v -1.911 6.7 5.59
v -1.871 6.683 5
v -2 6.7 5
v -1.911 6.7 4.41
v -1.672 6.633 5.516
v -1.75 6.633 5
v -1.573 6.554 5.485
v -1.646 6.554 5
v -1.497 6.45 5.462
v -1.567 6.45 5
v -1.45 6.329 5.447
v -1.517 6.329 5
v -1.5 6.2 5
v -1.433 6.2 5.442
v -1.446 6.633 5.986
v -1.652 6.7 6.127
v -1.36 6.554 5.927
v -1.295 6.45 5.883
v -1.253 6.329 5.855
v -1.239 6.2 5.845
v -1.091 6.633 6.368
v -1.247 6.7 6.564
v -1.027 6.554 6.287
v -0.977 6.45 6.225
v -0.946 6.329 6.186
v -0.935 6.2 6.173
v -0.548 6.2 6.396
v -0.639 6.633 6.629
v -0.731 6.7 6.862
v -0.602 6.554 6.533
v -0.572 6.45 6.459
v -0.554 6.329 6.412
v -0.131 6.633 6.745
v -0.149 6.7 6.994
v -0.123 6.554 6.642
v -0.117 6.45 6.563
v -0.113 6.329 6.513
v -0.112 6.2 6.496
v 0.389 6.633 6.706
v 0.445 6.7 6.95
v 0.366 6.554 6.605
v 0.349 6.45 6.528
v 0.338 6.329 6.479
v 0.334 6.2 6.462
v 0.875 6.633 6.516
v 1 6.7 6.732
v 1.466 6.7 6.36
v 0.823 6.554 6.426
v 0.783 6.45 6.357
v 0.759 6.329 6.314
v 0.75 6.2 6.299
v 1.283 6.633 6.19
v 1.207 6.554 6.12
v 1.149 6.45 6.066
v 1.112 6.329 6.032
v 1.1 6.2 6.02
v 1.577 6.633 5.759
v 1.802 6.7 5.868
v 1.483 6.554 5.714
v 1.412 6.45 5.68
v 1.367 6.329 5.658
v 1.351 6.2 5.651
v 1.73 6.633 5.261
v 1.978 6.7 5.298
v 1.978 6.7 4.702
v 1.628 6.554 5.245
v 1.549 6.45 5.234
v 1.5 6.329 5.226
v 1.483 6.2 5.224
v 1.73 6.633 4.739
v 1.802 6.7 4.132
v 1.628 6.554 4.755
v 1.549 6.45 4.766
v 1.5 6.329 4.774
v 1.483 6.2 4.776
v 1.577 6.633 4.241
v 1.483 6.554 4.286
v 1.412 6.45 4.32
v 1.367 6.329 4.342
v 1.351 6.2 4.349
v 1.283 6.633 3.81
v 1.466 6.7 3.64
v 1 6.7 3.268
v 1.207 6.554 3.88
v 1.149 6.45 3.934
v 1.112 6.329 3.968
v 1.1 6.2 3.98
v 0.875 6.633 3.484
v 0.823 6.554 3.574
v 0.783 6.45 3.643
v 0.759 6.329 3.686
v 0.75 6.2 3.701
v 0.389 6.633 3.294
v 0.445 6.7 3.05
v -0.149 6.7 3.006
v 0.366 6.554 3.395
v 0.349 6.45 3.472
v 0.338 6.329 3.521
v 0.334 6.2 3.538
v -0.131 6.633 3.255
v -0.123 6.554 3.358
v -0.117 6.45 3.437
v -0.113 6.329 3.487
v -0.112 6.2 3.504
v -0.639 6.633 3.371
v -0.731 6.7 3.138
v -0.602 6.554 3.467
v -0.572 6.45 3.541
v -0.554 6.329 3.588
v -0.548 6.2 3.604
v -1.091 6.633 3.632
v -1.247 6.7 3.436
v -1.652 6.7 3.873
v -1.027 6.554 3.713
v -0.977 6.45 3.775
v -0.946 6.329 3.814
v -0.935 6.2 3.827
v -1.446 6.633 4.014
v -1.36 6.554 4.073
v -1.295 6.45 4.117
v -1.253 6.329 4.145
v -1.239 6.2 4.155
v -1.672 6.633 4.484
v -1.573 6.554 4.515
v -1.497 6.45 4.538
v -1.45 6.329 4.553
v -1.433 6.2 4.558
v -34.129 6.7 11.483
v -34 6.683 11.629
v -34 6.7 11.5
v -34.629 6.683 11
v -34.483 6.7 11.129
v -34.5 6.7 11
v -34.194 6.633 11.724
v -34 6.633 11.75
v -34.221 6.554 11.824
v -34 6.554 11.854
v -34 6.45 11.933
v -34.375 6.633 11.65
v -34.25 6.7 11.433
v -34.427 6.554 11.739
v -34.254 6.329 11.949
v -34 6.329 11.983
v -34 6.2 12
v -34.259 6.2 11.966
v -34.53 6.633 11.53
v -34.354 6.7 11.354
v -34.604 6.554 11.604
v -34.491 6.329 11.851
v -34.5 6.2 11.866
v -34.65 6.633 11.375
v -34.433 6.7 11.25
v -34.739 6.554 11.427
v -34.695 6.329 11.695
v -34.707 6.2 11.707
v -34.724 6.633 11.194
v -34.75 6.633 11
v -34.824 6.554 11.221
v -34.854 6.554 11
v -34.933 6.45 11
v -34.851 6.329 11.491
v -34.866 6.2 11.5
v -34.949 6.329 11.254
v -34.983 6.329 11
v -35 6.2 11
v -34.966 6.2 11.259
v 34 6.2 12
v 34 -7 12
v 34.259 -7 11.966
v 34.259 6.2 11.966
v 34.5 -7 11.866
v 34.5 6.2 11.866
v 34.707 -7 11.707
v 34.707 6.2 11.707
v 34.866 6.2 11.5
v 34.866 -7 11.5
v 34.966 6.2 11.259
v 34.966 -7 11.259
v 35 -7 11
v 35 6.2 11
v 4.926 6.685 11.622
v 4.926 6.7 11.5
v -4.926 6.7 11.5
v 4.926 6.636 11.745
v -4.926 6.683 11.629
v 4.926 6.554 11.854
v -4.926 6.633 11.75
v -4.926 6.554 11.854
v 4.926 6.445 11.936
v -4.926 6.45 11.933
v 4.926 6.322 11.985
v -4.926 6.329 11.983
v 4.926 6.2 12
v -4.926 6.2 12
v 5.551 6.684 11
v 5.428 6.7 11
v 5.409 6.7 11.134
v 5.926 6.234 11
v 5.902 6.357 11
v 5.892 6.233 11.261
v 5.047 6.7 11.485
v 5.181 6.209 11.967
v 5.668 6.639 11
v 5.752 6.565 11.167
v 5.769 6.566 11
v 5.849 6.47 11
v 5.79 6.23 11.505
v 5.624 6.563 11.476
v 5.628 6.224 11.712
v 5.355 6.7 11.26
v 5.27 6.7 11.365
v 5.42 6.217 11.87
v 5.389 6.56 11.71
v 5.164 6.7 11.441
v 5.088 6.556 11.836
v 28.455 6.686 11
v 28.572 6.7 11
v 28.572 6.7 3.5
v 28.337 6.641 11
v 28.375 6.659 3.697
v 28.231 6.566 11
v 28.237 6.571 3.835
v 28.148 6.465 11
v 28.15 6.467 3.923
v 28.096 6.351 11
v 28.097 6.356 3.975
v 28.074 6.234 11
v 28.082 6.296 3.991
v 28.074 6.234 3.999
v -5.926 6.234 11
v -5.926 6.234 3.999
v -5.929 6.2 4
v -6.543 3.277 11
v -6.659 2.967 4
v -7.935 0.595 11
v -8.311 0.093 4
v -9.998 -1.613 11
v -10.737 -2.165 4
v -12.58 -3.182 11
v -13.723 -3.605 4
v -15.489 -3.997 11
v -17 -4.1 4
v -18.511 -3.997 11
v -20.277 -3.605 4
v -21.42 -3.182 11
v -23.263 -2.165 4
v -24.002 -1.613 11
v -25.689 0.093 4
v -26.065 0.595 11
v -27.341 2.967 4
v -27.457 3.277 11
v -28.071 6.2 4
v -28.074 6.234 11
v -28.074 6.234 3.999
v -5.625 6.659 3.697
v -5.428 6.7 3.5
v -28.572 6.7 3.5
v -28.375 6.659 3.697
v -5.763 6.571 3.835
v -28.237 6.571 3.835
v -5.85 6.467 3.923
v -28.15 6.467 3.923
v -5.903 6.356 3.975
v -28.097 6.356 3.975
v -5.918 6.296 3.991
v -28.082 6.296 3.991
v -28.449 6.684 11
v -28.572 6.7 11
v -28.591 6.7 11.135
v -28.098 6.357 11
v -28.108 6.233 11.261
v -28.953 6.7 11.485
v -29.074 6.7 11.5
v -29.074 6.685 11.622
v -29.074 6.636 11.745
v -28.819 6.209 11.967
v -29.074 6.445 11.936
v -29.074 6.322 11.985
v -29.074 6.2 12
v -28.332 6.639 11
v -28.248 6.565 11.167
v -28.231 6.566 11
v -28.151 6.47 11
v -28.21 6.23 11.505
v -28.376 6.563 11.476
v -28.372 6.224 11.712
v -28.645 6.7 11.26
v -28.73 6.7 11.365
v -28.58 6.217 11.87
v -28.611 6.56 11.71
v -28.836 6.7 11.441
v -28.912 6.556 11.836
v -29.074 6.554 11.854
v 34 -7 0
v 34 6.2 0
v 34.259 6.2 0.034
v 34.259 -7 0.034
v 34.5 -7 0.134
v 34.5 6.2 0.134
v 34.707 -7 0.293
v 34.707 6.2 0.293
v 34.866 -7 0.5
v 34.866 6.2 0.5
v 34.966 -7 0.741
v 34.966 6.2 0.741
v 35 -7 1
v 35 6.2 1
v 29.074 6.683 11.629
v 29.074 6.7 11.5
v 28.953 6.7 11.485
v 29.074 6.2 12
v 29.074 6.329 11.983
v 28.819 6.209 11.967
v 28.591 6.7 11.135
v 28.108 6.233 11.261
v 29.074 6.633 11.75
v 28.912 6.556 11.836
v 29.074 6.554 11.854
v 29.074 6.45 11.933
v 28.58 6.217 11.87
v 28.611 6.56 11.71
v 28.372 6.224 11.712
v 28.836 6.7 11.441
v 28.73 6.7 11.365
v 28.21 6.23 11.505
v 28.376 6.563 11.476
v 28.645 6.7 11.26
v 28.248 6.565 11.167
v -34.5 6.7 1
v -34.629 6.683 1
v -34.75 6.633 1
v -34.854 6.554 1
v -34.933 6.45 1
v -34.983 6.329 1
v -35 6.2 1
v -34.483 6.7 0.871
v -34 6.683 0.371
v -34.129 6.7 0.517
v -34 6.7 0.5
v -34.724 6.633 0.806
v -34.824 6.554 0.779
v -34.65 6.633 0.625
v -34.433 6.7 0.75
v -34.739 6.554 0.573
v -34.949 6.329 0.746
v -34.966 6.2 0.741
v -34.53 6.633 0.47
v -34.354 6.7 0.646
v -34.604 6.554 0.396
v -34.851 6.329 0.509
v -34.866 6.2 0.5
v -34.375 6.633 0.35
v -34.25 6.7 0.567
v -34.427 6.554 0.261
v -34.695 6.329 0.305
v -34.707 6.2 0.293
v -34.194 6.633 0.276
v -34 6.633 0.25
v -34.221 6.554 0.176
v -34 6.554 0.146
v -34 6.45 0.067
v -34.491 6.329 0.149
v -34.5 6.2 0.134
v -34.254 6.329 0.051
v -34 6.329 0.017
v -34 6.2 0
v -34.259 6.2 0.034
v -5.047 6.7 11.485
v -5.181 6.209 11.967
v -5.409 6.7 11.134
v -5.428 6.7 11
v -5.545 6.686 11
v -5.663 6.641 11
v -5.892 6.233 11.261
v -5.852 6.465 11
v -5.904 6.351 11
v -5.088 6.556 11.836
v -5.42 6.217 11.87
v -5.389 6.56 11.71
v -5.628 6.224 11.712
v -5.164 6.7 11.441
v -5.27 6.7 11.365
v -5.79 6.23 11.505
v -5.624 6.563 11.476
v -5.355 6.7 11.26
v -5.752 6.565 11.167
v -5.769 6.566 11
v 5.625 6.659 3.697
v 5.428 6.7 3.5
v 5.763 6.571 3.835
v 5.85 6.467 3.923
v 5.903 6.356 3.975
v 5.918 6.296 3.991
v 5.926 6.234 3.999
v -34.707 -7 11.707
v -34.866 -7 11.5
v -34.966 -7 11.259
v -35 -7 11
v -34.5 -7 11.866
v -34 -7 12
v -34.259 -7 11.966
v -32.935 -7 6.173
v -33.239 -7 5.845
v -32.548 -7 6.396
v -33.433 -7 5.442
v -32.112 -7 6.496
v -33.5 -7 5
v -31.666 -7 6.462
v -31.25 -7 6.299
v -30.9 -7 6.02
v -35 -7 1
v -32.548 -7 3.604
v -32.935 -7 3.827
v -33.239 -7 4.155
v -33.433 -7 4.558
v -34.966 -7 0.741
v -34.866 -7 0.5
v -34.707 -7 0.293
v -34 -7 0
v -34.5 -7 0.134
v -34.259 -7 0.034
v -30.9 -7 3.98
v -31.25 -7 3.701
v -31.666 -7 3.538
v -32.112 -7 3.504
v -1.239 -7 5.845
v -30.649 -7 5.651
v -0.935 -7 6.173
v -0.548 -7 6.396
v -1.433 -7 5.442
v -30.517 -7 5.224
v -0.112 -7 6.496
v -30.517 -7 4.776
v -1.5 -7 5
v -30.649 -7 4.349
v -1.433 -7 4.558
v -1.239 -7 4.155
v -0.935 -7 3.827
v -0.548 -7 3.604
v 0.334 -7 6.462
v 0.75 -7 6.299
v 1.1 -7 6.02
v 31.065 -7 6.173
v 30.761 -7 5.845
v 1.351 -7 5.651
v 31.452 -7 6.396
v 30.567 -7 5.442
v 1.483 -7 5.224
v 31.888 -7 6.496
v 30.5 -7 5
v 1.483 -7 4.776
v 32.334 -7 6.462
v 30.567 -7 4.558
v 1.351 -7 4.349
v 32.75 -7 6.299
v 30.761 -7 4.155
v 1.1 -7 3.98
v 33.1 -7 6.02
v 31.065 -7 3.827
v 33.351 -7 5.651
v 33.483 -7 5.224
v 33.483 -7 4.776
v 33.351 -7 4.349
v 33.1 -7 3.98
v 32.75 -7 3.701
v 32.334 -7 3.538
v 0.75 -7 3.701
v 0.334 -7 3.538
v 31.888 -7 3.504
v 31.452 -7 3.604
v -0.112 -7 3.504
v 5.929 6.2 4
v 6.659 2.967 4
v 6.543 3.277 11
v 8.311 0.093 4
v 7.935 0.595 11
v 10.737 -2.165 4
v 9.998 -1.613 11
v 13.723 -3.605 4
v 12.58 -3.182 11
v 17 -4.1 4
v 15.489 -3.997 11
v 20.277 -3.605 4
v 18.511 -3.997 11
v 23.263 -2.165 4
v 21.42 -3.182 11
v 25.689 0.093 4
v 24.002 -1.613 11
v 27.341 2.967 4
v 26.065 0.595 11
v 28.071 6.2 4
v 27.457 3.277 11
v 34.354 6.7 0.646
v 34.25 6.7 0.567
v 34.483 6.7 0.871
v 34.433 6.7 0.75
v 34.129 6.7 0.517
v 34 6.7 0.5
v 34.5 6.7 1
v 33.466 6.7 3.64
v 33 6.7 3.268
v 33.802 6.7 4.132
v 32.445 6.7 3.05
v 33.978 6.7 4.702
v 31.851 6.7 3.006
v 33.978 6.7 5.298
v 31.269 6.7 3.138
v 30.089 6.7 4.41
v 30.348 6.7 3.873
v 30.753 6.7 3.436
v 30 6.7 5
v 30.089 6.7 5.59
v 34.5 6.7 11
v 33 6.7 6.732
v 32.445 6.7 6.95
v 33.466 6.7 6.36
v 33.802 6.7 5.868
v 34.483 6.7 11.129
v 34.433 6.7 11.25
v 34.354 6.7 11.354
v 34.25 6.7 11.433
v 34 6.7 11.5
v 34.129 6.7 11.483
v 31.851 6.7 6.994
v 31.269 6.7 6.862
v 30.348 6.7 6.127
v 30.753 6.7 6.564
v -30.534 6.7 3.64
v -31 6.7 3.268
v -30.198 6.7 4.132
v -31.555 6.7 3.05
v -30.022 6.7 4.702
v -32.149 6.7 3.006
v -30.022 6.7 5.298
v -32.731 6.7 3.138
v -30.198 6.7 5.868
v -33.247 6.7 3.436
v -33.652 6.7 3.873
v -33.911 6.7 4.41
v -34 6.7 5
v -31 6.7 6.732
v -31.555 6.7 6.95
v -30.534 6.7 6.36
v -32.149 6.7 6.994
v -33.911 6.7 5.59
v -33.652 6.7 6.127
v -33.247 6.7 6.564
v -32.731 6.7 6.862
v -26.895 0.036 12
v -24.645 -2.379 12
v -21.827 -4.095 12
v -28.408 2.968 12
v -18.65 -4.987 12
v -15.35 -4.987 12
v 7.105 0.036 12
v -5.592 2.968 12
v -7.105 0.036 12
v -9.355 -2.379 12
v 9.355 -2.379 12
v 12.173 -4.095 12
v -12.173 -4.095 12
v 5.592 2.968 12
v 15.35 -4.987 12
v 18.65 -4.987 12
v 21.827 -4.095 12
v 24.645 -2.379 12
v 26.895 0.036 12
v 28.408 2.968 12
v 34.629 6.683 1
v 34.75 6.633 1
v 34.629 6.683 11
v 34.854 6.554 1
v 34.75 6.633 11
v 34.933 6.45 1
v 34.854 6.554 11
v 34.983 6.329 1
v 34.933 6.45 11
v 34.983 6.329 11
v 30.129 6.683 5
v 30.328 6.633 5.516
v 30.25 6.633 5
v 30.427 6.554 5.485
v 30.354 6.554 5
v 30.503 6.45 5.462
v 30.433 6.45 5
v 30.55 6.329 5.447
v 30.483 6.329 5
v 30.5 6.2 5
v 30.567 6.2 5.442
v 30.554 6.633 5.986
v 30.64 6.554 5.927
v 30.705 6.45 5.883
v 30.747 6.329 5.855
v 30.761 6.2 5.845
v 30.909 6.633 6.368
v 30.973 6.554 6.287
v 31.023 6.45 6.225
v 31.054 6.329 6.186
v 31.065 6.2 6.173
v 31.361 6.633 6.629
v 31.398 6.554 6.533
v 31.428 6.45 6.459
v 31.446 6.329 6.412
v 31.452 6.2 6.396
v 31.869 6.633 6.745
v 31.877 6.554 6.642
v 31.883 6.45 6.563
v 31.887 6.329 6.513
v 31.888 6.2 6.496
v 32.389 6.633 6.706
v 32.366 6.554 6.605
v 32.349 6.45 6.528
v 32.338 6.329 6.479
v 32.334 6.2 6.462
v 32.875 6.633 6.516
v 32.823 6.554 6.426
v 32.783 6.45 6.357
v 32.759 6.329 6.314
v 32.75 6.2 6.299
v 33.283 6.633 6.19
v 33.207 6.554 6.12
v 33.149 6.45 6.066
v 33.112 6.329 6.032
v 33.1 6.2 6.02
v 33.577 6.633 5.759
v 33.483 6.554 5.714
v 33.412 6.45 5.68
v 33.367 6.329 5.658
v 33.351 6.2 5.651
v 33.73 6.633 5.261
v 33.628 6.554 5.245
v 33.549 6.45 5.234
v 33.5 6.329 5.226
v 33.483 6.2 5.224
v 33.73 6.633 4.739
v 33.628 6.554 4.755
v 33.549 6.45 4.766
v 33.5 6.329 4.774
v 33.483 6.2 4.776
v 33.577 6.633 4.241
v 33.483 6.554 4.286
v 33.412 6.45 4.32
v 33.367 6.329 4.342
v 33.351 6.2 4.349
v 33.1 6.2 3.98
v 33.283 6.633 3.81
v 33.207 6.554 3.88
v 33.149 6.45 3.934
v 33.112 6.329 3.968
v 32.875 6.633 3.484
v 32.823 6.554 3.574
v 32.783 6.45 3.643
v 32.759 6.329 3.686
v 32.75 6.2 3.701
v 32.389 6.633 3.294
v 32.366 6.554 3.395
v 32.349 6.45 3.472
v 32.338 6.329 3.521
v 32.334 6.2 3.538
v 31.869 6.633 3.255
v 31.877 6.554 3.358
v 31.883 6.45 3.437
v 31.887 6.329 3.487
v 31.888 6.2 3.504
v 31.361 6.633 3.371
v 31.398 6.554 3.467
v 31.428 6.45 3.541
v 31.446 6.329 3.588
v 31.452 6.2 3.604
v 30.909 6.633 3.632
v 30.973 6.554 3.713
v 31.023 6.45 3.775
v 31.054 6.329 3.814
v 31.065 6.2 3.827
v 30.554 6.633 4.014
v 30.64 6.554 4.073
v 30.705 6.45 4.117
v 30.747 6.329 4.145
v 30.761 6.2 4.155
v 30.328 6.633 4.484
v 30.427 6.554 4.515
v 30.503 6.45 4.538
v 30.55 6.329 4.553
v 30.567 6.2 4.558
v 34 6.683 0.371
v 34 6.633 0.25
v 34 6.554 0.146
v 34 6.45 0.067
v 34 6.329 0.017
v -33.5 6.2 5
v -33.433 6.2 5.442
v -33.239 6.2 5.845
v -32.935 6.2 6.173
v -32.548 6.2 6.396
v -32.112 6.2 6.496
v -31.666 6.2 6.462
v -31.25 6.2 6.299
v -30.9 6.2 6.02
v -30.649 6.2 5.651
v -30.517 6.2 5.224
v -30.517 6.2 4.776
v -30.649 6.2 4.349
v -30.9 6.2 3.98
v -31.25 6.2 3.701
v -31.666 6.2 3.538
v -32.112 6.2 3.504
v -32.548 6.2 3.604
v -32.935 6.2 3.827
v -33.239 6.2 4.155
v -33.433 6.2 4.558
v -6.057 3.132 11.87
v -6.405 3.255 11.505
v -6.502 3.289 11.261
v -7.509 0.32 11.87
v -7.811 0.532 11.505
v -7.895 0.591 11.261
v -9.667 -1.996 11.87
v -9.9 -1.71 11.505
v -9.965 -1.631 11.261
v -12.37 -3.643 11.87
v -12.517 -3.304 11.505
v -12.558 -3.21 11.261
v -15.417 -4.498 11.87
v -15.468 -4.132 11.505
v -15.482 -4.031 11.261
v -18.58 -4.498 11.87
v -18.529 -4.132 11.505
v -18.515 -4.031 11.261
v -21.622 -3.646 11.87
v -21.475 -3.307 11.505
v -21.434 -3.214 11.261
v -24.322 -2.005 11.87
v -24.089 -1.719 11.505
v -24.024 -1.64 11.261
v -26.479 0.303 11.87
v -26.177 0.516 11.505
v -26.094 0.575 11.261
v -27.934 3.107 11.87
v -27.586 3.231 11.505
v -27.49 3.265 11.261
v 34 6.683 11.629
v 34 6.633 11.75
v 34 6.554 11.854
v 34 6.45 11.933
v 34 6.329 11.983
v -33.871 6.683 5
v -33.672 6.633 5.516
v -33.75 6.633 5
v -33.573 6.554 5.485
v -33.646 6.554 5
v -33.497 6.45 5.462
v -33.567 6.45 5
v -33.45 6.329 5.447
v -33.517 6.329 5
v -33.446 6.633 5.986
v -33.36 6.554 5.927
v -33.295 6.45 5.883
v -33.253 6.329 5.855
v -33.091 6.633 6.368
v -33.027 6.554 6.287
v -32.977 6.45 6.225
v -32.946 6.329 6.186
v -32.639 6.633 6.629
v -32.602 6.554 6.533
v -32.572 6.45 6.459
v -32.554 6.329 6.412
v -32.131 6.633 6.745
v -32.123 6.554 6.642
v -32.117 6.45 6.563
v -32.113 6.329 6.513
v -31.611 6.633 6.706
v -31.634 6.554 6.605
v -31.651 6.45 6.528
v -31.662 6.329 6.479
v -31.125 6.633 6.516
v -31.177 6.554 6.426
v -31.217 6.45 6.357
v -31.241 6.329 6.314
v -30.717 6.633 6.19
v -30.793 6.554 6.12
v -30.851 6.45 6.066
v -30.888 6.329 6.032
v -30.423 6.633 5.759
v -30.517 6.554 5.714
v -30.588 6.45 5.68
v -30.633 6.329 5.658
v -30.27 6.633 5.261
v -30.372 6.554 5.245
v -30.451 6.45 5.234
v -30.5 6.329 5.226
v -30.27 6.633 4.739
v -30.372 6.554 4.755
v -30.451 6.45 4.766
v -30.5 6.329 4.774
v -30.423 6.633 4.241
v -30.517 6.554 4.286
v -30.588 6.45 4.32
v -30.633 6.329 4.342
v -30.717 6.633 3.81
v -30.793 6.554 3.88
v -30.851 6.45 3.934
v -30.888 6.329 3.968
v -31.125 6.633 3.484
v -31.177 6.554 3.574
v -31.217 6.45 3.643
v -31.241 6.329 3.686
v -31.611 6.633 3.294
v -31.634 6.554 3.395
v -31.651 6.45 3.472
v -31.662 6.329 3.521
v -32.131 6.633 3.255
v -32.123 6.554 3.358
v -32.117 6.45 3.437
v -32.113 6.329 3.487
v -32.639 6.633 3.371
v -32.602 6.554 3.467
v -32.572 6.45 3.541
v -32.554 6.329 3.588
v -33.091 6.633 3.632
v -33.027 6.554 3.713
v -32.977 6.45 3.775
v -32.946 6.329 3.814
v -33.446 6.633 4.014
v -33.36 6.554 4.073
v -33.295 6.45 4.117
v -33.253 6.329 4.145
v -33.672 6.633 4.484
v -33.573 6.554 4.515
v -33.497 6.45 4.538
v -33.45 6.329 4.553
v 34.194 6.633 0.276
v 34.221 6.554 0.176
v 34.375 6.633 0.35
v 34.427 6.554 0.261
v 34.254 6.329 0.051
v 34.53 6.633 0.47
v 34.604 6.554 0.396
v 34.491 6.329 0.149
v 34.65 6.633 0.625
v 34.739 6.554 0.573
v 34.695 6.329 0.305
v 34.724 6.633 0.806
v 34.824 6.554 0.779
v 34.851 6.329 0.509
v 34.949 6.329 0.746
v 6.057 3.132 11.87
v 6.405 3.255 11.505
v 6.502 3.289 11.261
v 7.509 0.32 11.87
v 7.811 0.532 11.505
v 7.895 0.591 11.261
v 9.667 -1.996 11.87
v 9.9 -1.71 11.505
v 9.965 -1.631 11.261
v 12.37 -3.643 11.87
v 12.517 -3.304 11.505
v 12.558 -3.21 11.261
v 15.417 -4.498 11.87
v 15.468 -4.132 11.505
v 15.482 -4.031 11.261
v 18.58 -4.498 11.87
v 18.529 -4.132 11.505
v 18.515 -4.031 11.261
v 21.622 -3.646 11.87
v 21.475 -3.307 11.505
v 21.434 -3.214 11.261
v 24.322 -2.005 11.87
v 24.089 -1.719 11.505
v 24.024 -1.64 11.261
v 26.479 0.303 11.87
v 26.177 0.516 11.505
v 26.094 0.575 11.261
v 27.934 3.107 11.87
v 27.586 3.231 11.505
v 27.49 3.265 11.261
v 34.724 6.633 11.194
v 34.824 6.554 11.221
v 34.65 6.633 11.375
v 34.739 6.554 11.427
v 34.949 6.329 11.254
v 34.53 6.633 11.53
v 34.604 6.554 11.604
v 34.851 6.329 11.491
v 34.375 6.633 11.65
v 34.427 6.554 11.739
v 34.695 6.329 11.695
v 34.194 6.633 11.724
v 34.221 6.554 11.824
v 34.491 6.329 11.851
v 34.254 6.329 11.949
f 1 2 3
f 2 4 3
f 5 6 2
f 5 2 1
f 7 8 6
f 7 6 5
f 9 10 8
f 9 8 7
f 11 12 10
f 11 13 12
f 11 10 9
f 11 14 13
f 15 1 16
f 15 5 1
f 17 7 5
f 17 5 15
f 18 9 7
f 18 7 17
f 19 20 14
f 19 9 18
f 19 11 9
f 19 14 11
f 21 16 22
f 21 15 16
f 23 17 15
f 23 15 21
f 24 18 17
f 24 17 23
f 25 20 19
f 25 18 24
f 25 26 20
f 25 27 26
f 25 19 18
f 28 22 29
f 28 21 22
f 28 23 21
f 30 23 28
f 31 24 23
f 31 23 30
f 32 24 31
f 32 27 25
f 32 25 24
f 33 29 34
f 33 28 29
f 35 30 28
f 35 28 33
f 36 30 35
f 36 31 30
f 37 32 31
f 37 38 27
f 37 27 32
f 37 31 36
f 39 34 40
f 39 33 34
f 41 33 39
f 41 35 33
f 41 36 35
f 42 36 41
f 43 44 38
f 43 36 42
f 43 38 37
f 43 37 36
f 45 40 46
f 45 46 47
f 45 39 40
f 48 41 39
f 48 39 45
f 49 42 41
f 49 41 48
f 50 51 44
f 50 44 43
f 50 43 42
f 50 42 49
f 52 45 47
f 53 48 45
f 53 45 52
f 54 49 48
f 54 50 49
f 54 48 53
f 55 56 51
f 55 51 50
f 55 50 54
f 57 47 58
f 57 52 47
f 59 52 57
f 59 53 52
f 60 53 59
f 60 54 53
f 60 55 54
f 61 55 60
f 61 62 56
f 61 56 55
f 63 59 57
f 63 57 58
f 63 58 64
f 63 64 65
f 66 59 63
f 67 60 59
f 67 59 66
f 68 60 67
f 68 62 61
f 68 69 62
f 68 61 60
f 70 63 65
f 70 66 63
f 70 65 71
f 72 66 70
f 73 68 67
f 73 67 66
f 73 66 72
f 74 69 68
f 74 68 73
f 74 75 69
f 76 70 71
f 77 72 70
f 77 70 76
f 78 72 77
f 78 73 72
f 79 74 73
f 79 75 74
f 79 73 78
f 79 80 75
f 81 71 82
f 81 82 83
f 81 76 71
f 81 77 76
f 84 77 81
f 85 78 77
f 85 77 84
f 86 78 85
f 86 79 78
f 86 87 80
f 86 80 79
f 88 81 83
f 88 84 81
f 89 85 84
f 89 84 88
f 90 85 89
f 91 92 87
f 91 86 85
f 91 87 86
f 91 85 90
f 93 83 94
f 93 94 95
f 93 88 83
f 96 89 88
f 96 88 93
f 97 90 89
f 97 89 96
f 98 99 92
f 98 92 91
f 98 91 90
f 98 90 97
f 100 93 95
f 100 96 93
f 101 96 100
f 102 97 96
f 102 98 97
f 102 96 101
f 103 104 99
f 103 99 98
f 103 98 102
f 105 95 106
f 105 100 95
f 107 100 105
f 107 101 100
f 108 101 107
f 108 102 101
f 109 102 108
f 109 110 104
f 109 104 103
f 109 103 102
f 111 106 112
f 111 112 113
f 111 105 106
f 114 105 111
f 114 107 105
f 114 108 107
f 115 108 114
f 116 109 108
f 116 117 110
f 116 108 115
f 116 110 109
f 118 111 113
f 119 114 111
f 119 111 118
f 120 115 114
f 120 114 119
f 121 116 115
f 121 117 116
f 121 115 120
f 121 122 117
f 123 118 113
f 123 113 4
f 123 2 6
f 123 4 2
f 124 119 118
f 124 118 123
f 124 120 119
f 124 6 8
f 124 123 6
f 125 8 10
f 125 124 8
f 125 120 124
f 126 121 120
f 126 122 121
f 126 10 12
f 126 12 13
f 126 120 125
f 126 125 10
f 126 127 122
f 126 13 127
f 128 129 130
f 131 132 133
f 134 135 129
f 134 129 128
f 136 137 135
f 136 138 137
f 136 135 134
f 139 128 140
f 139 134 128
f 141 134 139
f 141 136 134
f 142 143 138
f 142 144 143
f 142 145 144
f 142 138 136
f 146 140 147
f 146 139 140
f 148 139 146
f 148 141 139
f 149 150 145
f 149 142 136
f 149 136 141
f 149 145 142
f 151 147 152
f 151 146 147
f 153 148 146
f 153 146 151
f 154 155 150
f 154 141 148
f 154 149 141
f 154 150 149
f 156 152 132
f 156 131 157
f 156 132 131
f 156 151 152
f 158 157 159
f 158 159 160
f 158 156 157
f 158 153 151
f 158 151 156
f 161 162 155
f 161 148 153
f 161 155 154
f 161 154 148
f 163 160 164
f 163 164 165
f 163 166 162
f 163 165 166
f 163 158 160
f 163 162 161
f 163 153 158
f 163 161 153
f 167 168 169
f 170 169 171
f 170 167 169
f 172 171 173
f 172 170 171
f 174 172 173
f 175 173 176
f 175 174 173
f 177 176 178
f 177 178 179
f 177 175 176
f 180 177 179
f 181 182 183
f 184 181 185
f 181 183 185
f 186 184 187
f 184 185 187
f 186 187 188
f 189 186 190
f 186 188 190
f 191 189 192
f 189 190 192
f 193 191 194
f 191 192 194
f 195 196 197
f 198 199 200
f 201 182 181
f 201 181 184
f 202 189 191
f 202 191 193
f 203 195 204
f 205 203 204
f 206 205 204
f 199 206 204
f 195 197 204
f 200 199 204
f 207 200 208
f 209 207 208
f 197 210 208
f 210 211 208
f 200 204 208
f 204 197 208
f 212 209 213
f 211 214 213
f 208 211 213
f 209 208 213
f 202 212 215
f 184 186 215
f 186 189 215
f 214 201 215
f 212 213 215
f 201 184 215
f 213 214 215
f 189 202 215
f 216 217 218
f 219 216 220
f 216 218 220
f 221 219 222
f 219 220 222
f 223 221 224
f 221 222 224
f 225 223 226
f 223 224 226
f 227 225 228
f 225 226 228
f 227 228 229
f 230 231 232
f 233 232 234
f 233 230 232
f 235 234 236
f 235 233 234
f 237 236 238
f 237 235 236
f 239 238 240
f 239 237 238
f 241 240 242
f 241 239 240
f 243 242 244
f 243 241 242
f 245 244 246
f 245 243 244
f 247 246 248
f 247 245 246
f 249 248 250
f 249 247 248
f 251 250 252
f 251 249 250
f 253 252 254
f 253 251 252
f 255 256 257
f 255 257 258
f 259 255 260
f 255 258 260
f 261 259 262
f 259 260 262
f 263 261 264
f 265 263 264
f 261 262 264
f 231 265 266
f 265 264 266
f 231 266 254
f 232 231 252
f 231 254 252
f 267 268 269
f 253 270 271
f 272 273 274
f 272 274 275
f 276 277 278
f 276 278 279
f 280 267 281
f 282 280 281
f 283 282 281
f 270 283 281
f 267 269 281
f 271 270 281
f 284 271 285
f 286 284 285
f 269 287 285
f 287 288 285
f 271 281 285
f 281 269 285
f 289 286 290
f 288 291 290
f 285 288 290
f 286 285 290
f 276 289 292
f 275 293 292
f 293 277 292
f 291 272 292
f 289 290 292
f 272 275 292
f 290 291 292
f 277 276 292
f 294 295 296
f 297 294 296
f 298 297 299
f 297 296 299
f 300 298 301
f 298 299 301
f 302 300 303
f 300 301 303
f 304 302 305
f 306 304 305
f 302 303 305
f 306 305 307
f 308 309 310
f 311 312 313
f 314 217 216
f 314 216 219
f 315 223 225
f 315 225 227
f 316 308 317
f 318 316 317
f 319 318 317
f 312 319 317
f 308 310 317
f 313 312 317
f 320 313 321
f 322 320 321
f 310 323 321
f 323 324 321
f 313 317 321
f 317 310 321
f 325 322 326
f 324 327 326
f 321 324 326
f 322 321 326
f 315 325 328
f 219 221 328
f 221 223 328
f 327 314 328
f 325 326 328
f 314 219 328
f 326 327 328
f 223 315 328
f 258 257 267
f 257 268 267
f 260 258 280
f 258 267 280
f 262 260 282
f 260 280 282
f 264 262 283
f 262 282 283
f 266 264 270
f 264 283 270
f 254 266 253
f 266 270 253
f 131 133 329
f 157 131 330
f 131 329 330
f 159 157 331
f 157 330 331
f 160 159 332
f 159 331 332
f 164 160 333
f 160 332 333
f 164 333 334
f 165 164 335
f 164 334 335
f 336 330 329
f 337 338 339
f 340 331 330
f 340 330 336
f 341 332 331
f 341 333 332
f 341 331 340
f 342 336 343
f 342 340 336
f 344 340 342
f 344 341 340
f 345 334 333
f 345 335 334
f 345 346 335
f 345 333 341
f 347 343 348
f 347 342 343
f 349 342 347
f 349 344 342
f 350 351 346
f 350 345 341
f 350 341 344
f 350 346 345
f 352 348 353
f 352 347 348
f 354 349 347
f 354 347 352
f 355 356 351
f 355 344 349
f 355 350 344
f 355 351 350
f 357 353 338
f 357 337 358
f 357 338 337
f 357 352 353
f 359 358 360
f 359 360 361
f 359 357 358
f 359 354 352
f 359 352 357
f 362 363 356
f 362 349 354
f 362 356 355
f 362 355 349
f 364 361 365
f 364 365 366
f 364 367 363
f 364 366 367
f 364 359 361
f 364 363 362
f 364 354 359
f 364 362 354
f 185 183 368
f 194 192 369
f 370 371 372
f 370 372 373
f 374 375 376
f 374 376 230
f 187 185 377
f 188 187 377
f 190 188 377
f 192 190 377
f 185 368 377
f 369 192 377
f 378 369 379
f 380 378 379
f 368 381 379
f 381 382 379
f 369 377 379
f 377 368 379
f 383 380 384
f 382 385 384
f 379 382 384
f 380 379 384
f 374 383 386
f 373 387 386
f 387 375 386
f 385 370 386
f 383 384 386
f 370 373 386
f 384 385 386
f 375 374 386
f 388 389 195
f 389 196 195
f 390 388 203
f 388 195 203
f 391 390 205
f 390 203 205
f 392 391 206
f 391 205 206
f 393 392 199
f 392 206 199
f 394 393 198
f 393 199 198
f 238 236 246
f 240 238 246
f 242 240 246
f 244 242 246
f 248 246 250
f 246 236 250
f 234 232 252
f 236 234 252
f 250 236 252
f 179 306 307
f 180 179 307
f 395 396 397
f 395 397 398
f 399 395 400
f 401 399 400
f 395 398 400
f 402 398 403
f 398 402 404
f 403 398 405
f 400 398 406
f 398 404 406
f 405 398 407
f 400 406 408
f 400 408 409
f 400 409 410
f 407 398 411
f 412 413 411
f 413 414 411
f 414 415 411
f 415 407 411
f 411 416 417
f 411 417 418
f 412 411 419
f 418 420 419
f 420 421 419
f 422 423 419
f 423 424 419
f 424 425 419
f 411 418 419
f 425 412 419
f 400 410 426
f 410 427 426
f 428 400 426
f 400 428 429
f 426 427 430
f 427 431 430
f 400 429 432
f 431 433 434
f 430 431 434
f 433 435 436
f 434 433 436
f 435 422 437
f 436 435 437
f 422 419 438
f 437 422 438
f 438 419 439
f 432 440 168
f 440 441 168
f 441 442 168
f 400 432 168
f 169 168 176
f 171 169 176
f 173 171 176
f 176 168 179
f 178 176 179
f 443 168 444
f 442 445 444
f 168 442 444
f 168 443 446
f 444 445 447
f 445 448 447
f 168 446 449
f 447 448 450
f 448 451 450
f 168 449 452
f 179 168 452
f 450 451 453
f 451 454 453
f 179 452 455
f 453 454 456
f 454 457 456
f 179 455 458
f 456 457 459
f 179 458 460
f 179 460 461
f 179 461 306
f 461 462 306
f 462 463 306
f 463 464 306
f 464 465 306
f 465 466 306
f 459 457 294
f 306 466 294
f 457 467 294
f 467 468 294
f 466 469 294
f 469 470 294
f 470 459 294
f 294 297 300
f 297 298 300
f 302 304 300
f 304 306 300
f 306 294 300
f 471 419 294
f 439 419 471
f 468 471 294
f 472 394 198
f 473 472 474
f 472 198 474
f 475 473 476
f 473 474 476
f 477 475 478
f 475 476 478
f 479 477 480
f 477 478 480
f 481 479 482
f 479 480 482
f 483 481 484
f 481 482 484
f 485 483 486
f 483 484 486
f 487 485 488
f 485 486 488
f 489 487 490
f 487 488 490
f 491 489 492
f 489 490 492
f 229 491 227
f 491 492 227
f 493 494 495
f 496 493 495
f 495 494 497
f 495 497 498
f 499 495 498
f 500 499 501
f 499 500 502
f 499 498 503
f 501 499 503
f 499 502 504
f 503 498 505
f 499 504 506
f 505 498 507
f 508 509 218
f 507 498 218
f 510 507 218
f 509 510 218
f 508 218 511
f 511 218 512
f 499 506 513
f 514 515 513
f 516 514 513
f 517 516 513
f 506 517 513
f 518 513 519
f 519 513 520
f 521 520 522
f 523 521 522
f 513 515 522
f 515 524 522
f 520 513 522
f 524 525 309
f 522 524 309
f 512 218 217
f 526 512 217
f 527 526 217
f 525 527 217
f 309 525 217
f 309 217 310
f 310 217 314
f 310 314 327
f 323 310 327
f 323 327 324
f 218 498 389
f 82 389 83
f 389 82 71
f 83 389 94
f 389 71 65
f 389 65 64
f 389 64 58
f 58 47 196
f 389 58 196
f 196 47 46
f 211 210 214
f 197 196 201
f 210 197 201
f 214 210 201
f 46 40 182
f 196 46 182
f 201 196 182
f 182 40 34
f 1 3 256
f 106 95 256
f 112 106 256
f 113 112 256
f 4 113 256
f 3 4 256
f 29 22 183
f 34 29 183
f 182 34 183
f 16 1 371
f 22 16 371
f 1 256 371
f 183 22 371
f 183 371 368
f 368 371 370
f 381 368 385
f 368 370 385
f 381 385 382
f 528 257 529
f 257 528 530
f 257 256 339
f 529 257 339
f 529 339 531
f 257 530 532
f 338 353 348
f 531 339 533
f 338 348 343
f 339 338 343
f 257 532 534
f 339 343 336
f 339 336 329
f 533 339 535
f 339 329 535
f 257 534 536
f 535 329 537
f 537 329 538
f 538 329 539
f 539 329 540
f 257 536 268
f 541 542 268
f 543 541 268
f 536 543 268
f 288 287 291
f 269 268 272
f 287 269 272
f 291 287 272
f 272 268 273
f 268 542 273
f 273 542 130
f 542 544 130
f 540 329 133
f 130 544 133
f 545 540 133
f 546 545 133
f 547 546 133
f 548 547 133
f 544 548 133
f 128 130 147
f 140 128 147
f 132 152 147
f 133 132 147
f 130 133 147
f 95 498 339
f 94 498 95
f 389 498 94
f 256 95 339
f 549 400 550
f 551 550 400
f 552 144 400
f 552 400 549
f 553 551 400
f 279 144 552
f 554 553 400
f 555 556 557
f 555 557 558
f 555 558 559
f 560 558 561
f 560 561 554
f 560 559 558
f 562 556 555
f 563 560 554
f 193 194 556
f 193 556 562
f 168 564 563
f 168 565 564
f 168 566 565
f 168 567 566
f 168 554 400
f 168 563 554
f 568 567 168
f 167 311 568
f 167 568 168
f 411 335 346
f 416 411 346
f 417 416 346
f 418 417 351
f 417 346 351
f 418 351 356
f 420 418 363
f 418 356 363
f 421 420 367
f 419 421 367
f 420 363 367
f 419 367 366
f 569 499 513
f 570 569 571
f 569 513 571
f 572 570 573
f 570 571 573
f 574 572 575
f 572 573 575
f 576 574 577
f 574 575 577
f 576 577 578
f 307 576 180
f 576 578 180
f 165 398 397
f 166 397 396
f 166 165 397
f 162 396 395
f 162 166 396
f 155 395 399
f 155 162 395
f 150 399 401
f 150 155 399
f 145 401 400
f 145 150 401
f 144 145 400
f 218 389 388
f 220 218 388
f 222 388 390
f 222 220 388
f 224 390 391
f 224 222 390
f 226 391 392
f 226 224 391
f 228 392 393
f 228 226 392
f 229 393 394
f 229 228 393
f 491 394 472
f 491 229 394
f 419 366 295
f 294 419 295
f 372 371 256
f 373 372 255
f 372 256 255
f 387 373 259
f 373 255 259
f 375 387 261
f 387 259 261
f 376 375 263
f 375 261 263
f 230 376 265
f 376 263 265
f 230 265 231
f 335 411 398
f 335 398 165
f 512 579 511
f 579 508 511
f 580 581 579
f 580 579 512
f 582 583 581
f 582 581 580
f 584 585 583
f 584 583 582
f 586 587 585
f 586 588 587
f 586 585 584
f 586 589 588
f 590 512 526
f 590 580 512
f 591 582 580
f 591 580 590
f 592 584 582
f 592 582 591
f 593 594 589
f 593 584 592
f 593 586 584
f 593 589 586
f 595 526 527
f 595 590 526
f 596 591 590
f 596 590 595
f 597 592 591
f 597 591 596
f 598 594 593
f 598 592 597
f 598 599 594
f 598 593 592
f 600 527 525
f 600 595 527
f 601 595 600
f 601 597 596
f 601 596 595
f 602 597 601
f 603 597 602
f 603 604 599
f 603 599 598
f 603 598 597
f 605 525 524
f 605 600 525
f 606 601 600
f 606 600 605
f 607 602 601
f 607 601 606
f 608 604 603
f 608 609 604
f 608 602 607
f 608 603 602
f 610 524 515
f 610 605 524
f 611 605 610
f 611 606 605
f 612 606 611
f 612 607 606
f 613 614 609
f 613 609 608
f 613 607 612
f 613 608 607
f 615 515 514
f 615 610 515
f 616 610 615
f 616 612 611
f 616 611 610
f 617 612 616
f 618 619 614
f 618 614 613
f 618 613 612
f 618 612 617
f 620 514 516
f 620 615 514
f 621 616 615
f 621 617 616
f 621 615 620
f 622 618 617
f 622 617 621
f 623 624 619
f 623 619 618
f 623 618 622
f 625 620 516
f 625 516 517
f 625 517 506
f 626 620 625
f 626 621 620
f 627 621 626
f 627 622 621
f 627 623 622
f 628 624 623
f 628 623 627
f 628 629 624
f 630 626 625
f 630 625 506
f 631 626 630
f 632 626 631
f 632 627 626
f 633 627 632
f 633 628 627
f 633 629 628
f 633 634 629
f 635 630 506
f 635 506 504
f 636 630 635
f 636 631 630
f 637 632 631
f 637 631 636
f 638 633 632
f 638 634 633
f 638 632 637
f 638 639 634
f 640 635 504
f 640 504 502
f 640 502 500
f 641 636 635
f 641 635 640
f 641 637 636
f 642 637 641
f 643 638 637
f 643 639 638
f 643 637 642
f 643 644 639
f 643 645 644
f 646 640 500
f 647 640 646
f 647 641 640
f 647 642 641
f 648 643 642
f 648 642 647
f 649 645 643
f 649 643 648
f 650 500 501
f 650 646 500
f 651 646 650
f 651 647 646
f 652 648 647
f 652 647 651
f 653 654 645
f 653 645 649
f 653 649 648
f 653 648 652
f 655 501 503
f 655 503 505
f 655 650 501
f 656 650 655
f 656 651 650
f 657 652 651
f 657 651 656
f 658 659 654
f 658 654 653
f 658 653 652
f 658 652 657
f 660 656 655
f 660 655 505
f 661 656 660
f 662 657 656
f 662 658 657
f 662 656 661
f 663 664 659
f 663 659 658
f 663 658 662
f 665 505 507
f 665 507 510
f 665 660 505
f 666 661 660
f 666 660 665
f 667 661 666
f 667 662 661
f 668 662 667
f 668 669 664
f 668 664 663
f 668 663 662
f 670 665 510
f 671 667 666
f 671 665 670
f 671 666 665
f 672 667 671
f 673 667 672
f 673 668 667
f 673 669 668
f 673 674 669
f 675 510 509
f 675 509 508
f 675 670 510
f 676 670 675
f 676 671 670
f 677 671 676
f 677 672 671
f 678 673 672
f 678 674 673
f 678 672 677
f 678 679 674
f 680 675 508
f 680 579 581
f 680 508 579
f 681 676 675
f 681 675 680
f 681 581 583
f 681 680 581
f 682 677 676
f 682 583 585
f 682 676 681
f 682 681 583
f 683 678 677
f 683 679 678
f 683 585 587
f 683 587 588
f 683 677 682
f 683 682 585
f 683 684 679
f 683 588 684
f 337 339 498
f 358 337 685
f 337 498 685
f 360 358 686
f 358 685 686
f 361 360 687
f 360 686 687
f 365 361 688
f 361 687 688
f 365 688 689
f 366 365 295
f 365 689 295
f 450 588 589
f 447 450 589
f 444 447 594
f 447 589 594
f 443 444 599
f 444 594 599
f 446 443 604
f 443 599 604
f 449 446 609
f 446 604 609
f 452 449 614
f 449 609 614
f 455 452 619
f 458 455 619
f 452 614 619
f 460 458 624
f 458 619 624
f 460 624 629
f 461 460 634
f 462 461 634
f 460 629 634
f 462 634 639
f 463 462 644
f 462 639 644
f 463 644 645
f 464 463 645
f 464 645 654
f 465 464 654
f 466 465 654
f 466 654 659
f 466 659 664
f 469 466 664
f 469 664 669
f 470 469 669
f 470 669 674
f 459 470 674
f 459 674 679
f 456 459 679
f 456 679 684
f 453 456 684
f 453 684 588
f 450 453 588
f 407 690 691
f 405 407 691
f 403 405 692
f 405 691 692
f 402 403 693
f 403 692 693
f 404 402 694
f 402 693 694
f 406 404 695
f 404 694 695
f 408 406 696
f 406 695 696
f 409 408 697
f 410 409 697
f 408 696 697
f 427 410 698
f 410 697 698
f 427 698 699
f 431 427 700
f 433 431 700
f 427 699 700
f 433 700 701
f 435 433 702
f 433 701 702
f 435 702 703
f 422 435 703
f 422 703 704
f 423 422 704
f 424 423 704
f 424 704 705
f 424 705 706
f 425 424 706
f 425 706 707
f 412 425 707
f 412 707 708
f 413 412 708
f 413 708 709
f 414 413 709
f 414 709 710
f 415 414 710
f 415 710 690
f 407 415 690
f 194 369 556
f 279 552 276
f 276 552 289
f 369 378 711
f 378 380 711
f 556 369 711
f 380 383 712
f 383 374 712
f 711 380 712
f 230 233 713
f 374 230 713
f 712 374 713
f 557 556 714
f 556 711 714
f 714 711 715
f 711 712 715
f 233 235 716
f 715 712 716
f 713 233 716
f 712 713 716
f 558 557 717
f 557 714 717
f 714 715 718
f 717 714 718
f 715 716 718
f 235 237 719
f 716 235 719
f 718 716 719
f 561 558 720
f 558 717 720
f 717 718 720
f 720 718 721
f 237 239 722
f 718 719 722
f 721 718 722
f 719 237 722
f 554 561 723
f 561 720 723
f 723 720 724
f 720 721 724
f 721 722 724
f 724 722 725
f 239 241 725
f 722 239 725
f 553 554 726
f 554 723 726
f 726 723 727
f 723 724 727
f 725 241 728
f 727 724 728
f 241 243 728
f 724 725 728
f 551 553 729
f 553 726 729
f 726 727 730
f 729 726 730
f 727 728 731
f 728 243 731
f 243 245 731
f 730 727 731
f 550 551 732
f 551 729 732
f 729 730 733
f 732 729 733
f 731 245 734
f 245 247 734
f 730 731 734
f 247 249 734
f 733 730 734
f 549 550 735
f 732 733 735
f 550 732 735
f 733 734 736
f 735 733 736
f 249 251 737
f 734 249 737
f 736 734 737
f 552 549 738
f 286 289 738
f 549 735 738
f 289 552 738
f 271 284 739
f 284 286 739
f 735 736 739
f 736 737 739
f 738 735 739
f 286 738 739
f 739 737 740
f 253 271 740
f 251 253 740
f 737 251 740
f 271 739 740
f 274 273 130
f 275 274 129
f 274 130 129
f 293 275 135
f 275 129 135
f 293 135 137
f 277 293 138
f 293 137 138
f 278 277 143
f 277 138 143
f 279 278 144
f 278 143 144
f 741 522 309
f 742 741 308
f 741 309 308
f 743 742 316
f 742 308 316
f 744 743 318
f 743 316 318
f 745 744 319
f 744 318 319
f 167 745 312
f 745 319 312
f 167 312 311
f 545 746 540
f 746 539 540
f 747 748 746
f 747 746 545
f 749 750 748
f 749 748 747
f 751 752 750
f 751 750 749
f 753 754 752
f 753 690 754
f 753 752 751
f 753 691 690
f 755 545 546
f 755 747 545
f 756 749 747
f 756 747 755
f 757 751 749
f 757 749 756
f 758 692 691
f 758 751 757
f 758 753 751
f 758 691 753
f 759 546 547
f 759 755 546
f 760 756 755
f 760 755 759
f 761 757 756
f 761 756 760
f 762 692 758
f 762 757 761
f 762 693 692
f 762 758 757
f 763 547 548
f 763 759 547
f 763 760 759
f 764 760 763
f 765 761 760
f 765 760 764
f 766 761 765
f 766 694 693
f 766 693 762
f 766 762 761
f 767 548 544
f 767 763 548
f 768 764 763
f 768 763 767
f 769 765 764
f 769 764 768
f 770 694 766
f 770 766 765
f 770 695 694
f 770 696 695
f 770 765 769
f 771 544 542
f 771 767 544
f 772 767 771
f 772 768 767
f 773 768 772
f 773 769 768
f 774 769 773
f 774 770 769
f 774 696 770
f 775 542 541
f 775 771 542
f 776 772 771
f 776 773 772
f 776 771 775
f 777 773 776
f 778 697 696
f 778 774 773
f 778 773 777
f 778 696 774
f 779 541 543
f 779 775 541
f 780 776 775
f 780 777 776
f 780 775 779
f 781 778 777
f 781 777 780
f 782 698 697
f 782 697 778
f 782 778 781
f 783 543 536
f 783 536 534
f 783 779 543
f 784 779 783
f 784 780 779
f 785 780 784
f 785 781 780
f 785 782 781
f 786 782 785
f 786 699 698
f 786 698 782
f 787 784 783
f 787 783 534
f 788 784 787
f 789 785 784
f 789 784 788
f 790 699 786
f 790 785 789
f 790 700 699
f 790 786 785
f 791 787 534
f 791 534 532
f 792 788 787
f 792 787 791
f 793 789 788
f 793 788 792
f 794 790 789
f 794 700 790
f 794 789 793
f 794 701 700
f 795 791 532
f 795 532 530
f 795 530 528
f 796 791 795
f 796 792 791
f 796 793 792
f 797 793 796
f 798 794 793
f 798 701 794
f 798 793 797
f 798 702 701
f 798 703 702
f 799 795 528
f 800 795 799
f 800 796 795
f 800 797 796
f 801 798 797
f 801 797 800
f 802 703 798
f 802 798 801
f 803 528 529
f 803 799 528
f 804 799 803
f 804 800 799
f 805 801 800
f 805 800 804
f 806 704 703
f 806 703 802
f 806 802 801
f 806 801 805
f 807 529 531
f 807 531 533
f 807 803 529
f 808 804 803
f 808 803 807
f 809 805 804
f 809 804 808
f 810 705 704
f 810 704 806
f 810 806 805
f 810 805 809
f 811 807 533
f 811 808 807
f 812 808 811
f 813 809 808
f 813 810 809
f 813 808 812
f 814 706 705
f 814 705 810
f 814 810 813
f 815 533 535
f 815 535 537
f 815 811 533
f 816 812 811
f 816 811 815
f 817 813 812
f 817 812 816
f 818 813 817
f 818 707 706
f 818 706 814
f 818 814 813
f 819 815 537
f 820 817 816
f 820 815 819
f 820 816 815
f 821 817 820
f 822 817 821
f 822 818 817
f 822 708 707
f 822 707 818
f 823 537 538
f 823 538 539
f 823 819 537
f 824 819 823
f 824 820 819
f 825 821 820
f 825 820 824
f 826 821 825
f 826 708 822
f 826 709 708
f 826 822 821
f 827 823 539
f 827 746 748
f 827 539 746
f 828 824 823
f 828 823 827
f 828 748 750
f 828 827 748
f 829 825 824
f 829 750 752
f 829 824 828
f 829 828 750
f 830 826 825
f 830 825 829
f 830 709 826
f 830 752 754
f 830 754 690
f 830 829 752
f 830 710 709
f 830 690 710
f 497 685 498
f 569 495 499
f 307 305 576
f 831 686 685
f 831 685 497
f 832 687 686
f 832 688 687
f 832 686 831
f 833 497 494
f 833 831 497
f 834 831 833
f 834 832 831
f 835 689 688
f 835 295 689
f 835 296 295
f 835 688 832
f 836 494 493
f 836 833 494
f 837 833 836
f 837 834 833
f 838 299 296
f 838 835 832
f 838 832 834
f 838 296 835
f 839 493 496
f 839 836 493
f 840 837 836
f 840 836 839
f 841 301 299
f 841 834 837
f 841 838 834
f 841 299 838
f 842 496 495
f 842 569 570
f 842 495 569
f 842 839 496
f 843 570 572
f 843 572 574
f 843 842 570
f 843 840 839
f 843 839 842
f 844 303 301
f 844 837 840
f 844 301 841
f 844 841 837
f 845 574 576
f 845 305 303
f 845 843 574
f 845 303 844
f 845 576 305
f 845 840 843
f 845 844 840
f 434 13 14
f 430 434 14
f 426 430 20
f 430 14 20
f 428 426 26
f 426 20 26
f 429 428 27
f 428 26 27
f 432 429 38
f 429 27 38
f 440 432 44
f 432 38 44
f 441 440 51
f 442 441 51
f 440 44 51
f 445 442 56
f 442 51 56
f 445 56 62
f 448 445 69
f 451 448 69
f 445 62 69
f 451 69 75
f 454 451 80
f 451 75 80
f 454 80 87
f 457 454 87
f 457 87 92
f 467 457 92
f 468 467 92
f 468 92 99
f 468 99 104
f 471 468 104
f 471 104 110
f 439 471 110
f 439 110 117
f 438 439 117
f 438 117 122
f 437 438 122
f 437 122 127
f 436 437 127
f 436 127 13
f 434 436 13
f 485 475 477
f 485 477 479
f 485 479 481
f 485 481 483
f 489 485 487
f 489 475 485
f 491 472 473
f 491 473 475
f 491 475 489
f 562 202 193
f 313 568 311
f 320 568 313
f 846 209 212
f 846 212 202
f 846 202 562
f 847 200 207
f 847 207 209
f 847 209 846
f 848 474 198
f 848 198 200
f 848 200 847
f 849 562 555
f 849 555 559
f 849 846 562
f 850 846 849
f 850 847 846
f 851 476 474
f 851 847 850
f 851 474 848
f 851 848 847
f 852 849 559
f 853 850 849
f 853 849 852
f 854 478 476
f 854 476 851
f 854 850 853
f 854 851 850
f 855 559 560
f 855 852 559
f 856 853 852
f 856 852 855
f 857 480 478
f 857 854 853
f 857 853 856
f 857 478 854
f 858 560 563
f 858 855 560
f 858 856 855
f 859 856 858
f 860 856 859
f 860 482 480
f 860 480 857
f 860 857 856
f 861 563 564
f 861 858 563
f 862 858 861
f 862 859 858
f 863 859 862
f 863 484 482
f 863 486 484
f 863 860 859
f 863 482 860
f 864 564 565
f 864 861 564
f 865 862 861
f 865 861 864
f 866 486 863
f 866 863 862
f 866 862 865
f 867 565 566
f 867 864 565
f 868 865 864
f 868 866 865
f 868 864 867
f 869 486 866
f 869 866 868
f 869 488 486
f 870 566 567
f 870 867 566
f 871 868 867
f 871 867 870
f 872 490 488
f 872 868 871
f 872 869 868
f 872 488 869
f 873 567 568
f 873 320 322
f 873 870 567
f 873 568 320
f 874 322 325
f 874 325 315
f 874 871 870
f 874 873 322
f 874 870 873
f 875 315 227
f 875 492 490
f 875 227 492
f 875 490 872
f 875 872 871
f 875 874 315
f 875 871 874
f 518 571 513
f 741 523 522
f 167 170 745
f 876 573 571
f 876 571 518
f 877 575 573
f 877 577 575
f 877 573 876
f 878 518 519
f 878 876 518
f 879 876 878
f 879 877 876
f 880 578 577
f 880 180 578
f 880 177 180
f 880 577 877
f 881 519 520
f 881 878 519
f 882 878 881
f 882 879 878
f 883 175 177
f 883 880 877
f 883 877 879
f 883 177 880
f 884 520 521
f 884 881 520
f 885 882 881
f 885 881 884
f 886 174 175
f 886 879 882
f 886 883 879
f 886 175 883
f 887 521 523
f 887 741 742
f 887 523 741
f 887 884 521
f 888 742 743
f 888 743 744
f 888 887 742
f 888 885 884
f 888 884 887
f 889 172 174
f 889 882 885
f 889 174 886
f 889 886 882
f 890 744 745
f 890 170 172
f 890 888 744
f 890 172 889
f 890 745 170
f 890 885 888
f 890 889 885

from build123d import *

# Parameters (mm, degrees)
SKETCH1_W           = 70
SKETCH1_H           = 14
BOSS_EXTRUDE1_DEPTH = 12
CUT_EXTRUDE1_DEPTH  = 8
SKETCH3_R           = 1.5
CUT_EXTRUDE2_DEPTH  = 40.56008089
SKETCH4_W           = 12
SKETCH4_H           = 0.3
CUT_EXTRUDE3_DEPTH  = 72.365257654
FILLET1_R           = 1
FILLET2_R           = 0.5


with BuildPart() as part:
    # Sketch1 → Boss-Extrude1 (new body)
    with BuildSketch(Plane.XY):
        Rectangle(SKETCH1_W, SKETCH1_H)
    extrude(amount=BOSS_EXTRUDE1_DEPTH)

    # Sketch2 → Cut-Extrude1 (cut)
    with BuildSketch(Plane.XY.offset(12)):
        with BuildLine():
            Line((5.9, 7), (28.1, 7))
            ThreePointArc((28.1, 7), (17, 18.1), (5.9, 7))
        make_face()
        with BuildLine():
            ThreePointArc((5.9, 7), (17, -4.1), (28.1, 7))
            Line((28.1, 7), (5.9, 7))
        make_face()
    cut_extrude1 = extrude(amount=-CUT_EXTRUDE1_DEPTH, mode=Mode.SUBTRACT)

    # Mirror1: Cut-Extrude1 across plane
    add(cut_extrude1.mirror(Plane(origin=(0, 0, 0), x_dir=(0, 0, 1), z_dir=(1, 0, 0))), mode=Mode.SUBTRACT)

    # Sketch3 → Cut-Extrude2 (cut, through all)
    with BuildSketch(Plane(origin=(0, 7, 0), x_dir=(1, 0, 0), z_dir=(0, 1, 0))):
        with Locations(Location((-32, -5, 0), (0, 0, 180))):
            Circle(SKETCH3_R)
        with Locations(Location((0, -5, 0), (0, 0, 180))):
            Circle(SKETCH3_R)
        with Locations(Location((32, -5, 0), (0, 0, 180))):
            Circle(SKETCH3_R)
    extrude(amount=-CUT_EXTRUDE2_DEPTH, mode=Mode.SUBTRACT)

    # Sketch4 → Cut-Extrude3 (cut, through all)
    with BuildSketch(Plane.ZY.offset(35)):
        with Locations((6, 6.85)):
            Rectangle(SKETCH4_W, SKETCH4_H)
    extrude(amount=-CUT_EXTRUDE3_DEPTH, mode=Mode.SUBTRACT)

    # Fillet1
    fillet1_edges = [part.edges().sort_by_distance(p)[0] for p in [
        (35, -0.15, 12),
        (-17, -4.1, 12),
        (35, -0.15, 0),
        (17, -4.1, 12),
        (-35, -0.15, 0),
        (-35, -0.15, 12),
    ]]
    fillet(fillet1_edges, radius=FILLET1_R)

    # Fillet2
    fillet2_edges = [part.edges().sort_by_distance(p)[0] for p in [
        (-30.5, 6.7, 5),
        (33.5, 6.7, 5),
        (1.5, 6.7, 5),
        (5.904054795, 6.7, 7.5),
        (-17, 6.7, 4),
        (-5.904054795, 6.7, 7.5),
        (17, 6.7, 4),
        (35, 6.7, 6),
        (31.54814021, 6.7, 12),
        (0, 6.7, 0),
        (-35, 6.7, 6),
        (-31.54814021, 6.7, 12),
        (-28.095945205, 6.7, 7.5),
        (0, 6.7, 12),
        (28.095945205, 6.7, 7.5),
        (-34.707106781, 6.7, 11.707106781),
        (-34.707106781, 6.7, 0.292893219),
        (-5.611001162, 6.7, 11.707162854),
        (-28.389554556, 6.7, 11.707717855),
        (5.611001162, 6.7, 11.707162854),
        (28.389554556, 6.7, 11.707717855),
        (34.707106781, 6.7, 11.707106781),
        (34.707106781, 6.7, 0.292893219),
    ]]
    fillet(fillet2_edges, radius=FILLET2_R)


solid = part.part
